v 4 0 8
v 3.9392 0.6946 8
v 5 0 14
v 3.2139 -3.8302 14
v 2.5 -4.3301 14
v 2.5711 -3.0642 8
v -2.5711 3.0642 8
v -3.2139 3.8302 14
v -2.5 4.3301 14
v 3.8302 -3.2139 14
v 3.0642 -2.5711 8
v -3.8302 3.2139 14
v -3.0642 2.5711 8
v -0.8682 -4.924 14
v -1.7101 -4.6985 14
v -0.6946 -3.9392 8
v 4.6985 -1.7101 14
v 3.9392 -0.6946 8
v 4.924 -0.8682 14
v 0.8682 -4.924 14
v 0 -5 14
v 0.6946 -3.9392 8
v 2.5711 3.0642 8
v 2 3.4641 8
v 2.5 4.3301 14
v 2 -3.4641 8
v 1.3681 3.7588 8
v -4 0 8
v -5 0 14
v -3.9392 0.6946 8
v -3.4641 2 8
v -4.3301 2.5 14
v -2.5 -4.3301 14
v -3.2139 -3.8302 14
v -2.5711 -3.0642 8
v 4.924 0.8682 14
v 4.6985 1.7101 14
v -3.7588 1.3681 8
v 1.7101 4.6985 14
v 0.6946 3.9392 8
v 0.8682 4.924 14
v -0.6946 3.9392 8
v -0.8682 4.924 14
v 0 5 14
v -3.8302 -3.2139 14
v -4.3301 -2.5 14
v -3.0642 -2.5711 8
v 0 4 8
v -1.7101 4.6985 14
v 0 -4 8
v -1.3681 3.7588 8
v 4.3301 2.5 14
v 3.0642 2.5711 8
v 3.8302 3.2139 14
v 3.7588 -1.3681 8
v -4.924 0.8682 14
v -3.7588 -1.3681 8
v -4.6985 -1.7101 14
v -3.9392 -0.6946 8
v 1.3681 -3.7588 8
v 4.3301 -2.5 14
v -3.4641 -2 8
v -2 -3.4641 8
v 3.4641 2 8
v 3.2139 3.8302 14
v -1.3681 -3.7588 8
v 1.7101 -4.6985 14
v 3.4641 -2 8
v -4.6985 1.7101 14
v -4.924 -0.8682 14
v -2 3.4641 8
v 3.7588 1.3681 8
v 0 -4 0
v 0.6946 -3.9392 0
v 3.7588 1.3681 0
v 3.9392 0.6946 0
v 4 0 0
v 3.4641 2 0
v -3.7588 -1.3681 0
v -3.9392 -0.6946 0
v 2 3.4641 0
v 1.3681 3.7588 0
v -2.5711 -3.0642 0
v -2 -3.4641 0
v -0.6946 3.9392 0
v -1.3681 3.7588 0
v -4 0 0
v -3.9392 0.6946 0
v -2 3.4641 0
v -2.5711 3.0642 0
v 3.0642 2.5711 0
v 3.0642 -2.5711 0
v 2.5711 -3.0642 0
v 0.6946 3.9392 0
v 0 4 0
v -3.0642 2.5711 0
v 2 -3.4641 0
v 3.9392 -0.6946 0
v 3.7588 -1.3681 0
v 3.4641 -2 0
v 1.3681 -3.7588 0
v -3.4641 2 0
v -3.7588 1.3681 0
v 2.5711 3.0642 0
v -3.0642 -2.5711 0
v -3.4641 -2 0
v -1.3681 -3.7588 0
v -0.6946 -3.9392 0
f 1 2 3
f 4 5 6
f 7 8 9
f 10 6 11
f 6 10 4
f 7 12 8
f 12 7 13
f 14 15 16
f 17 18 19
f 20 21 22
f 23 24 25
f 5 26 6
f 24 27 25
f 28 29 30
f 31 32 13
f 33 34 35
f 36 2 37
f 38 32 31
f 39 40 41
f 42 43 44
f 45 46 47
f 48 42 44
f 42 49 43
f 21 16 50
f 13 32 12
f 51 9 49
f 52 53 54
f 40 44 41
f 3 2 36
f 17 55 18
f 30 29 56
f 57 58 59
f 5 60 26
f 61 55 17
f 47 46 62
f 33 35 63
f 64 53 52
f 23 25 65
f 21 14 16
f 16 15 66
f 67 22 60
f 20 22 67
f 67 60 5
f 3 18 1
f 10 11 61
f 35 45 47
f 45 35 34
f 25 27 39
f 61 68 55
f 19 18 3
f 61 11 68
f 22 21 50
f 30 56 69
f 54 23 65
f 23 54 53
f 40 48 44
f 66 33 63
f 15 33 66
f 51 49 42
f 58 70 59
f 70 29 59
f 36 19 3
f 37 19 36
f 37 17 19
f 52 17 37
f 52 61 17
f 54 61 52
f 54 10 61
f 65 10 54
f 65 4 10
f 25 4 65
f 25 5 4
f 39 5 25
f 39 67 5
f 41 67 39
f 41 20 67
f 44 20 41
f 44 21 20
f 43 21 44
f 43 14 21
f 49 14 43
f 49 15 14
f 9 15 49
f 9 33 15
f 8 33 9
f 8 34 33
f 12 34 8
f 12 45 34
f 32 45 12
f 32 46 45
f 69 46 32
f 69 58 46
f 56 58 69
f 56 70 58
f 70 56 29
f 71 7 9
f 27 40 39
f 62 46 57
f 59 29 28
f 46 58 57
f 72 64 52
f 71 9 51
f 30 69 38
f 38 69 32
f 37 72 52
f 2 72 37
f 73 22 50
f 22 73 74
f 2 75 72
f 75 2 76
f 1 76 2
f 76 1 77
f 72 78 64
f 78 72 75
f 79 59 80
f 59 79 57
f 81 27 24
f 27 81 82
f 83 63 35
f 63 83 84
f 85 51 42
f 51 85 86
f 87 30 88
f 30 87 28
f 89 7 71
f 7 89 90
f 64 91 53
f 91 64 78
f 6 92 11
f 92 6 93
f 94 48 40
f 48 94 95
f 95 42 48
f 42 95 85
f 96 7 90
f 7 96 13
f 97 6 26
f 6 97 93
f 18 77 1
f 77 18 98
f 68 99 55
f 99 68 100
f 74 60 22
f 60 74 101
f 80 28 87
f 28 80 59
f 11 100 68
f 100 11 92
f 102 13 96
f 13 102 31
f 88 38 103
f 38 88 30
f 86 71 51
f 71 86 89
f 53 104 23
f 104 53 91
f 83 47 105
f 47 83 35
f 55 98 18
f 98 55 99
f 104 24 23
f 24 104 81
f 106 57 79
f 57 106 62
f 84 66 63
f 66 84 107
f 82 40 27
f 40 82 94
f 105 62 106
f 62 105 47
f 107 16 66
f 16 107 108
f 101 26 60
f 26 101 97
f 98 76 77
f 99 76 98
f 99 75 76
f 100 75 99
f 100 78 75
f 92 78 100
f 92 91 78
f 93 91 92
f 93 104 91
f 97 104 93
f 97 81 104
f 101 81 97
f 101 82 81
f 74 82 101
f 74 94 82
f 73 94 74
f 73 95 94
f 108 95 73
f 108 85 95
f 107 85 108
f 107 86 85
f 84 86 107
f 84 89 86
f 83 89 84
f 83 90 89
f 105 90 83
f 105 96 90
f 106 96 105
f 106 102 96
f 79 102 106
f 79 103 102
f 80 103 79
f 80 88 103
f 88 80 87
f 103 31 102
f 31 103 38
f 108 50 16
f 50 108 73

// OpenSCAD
handle_axis_r=8/2;
handle_axis_top_r=10/2;
handle_thickness=6;
clamp_base_thickness=4;
plate_height=10;

axis_height=plate_height+clamp_base_thickness-handle_thickness;

translate([0,0,axis_height])
cylinder(r1=handle_axis_r, r2=handle_axis_top_r, h=handle_thickness, $fn=36);
cylinder(r=handle_axis_r, h=axis_height, $fn=36);
